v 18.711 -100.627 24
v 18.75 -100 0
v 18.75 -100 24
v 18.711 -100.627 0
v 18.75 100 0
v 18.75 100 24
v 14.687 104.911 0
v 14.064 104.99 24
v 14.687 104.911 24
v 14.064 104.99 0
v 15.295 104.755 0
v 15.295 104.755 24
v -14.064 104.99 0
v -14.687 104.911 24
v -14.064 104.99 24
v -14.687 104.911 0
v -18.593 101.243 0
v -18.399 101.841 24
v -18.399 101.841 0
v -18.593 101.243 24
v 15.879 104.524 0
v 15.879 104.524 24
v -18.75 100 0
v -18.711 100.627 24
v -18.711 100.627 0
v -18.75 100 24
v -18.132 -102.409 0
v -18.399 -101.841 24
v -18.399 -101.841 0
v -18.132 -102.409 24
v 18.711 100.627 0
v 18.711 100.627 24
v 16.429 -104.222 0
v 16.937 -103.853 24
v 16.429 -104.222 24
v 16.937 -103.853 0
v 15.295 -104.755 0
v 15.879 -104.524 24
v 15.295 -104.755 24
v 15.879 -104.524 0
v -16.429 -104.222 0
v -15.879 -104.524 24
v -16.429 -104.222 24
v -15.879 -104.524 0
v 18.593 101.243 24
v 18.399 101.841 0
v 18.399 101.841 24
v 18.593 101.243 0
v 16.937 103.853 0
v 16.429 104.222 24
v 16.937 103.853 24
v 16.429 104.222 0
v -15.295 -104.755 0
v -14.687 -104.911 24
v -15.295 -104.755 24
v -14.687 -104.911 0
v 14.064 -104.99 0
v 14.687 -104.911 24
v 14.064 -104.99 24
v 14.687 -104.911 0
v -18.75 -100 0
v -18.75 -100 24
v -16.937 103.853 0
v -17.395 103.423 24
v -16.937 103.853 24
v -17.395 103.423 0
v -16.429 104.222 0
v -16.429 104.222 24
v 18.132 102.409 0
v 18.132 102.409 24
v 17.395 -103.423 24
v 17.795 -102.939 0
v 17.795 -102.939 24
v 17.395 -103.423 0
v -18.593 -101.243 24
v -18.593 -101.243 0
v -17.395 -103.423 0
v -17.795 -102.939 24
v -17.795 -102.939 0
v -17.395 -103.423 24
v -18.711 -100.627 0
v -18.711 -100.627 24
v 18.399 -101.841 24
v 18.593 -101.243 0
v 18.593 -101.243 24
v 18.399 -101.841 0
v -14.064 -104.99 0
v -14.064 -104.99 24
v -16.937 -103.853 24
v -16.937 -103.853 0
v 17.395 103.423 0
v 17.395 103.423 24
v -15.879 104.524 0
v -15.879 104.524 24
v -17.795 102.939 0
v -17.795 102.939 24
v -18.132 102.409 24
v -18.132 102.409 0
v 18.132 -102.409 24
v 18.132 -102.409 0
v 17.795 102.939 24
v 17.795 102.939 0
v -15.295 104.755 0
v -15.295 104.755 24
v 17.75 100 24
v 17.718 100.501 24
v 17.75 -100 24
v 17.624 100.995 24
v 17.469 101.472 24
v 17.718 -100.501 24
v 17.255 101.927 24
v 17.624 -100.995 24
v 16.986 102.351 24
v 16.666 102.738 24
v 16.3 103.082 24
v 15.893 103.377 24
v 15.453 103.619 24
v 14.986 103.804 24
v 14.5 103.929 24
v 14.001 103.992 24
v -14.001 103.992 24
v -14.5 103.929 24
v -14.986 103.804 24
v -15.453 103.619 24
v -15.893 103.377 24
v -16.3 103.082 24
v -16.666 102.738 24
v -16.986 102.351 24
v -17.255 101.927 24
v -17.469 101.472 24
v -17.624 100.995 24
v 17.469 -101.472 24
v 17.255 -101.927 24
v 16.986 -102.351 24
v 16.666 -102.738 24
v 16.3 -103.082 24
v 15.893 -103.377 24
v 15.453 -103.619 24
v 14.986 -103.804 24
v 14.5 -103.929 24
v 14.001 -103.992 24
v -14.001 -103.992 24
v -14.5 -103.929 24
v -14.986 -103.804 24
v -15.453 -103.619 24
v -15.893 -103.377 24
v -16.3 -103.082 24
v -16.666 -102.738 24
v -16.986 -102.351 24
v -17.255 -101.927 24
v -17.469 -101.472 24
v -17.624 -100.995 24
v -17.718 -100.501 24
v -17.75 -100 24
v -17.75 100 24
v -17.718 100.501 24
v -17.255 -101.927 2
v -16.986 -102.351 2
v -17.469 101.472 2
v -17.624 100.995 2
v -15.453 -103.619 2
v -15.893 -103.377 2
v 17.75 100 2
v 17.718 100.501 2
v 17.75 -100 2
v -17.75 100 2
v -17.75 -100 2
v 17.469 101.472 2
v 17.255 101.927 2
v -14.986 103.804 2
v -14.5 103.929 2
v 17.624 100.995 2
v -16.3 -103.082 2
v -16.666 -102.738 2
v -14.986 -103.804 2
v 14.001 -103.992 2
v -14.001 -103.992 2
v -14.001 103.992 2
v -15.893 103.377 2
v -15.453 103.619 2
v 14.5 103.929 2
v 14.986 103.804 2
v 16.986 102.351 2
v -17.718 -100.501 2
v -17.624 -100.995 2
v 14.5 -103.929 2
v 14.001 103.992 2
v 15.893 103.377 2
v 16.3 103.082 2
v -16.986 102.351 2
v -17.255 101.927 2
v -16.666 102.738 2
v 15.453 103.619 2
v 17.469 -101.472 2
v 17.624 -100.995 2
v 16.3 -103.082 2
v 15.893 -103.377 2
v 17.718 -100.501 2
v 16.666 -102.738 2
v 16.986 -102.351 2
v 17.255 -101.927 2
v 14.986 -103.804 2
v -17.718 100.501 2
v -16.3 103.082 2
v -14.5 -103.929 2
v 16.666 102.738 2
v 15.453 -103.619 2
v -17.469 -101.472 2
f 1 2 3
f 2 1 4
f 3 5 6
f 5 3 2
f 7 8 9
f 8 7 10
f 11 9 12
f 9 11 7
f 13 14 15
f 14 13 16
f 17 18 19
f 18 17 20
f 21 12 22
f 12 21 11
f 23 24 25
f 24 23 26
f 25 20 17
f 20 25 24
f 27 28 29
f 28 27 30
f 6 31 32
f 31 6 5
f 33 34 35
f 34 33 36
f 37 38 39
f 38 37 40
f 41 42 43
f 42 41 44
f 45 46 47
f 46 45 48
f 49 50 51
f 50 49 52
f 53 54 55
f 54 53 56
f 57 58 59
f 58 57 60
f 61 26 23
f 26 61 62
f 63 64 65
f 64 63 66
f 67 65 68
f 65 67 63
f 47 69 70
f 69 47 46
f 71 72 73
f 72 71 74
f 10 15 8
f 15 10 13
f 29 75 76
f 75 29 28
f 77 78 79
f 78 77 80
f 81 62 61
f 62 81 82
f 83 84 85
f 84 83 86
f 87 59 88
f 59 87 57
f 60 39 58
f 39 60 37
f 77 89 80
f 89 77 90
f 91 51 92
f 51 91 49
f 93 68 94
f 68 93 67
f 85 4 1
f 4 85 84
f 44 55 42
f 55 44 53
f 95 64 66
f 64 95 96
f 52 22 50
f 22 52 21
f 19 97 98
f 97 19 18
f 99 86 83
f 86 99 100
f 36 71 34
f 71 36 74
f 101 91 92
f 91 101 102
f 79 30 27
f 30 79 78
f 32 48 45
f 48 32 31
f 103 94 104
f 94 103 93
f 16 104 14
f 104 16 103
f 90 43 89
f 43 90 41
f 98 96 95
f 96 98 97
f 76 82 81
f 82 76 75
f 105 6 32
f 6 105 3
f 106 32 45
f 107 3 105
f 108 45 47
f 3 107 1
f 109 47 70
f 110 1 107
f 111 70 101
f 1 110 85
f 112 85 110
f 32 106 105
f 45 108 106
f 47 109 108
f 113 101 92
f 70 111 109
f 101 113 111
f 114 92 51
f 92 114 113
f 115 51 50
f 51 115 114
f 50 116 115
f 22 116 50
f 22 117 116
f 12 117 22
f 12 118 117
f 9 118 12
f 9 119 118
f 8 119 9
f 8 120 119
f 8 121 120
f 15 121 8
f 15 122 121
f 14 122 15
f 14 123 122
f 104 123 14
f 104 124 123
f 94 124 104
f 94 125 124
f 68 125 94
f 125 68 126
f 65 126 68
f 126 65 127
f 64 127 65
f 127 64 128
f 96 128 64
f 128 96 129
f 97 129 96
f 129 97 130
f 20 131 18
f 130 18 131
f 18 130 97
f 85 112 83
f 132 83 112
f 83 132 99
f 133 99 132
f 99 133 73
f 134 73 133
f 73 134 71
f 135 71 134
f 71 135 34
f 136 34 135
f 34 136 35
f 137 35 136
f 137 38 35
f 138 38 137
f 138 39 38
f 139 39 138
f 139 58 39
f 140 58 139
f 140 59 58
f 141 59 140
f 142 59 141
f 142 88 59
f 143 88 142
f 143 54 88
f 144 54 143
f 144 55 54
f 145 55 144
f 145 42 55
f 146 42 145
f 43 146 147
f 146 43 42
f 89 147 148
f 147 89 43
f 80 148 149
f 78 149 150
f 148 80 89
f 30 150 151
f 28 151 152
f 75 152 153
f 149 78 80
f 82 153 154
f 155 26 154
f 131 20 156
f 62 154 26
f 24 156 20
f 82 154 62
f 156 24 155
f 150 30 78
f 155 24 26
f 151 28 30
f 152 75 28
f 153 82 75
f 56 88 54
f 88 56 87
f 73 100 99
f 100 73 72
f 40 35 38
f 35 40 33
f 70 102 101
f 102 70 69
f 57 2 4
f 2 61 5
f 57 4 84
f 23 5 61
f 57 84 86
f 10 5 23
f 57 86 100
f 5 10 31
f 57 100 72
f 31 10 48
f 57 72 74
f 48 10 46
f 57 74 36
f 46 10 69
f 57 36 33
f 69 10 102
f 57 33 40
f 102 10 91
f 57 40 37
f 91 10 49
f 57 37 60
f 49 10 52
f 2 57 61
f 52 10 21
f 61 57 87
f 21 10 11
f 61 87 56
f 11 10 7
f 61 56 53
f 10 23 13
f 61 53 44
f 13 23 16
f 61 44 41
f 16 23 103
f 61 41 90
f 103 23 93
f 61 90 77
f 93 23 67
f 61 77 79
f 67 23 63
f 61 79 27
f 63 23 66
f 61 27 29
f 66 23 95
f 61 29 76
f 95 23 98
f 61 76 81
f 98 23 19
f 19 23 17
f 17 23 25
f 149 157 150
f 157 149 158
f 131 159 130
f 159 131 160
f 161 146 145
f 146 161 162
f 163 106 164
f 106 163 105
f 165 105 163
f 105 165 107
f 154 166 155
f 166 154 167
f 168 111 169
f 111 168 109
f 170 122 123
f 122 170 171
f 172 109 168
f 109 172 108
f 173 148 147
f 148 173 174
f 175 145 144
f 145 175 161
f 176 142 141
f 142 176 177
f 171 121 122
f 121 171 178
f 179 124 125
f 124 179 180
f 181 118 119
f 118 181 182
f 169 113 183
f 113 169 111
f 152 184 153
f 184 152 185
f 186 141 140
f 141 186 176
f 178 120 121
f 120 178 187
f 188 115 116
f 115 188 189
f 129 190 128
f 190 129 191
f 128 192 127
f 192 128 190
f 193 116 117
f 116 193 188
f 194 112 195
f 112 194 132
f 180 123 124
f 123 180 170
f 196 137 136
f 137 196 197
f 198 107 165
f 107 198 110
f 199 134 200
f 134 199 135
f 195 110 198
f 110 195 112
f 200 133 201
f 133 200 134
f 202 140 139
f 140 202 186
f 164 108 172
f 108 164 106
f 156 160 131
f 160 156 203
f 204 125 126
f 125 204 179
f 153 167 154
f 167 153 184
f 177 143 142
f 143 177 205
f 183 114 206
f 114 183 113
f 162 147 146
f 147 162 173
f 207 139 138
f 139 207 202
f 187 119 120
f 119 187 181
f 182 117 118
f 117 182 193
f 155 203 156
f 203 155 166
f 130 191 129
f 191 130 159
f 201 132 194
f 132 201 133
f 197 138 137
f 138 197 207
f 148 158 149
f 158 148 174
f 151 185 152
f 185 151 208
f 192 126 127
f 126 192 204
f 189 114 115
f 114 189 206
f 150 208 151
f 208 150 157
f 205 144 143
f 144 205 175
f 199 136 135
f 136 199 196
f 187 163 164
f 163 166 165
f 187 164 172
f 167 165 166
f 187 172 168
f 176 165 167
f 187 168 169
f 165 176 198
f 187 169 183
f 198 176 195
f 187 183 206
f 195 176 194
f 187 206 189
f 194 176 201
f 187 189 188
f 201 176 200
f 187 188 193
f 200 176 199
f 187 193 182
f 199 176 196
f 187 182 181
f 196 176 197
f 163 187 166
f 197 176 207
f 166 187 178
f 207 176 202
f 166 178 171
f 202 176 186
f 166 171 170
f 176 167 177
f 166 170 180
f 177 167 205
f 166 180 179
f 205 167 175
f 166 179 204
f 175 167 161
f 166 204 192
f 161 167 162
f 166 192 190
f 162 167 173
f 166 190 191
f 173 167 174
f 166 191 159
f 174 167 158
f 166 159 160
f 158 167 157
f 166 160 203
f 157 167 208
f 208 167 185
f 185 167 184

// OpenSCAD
$fn = 50;


difference() {
	union() {
		hull() {
			translate(v = [-13.7500000000, 100.0000000000, 0]) {
				cylinder(h = 24, r = 5);
			}
			translate(v = [13.7500000000, 100.0000000000, 0]) {
				cylinder(h = 24, r = 5);
			}
			translate(v = [-13.7500000000, -100.0000000000, 0]) {
				cylinder(h = 24, r = 5);
			}
			translate(v = [13.7500000000, -100.0000000000, 0]) {
				cylinder(h = 24, r = 5);
			}
		}
	}
	union() {
		translate(v = [0, 0, 2]) {
			hull() {
				translate(v = [-13.7500000000, 100.0000000000, 0]) {
					cylinder(h = 22, r = 4);
				}
				translate(v = [13.7500000000, 100.0000000000, 0]) {
					cylinder(h = 22, r = 4);
				}
				translate(v = [-13.7500000000, -100.0000000000, 0]) {
					cylinder(h = 22, r = 4);
				}
				translate(v = [13.7500000000, -100.0000000000, 0]) {
					cylinder(h = 22, r = 4);
				}
			}
		}
	}
}
